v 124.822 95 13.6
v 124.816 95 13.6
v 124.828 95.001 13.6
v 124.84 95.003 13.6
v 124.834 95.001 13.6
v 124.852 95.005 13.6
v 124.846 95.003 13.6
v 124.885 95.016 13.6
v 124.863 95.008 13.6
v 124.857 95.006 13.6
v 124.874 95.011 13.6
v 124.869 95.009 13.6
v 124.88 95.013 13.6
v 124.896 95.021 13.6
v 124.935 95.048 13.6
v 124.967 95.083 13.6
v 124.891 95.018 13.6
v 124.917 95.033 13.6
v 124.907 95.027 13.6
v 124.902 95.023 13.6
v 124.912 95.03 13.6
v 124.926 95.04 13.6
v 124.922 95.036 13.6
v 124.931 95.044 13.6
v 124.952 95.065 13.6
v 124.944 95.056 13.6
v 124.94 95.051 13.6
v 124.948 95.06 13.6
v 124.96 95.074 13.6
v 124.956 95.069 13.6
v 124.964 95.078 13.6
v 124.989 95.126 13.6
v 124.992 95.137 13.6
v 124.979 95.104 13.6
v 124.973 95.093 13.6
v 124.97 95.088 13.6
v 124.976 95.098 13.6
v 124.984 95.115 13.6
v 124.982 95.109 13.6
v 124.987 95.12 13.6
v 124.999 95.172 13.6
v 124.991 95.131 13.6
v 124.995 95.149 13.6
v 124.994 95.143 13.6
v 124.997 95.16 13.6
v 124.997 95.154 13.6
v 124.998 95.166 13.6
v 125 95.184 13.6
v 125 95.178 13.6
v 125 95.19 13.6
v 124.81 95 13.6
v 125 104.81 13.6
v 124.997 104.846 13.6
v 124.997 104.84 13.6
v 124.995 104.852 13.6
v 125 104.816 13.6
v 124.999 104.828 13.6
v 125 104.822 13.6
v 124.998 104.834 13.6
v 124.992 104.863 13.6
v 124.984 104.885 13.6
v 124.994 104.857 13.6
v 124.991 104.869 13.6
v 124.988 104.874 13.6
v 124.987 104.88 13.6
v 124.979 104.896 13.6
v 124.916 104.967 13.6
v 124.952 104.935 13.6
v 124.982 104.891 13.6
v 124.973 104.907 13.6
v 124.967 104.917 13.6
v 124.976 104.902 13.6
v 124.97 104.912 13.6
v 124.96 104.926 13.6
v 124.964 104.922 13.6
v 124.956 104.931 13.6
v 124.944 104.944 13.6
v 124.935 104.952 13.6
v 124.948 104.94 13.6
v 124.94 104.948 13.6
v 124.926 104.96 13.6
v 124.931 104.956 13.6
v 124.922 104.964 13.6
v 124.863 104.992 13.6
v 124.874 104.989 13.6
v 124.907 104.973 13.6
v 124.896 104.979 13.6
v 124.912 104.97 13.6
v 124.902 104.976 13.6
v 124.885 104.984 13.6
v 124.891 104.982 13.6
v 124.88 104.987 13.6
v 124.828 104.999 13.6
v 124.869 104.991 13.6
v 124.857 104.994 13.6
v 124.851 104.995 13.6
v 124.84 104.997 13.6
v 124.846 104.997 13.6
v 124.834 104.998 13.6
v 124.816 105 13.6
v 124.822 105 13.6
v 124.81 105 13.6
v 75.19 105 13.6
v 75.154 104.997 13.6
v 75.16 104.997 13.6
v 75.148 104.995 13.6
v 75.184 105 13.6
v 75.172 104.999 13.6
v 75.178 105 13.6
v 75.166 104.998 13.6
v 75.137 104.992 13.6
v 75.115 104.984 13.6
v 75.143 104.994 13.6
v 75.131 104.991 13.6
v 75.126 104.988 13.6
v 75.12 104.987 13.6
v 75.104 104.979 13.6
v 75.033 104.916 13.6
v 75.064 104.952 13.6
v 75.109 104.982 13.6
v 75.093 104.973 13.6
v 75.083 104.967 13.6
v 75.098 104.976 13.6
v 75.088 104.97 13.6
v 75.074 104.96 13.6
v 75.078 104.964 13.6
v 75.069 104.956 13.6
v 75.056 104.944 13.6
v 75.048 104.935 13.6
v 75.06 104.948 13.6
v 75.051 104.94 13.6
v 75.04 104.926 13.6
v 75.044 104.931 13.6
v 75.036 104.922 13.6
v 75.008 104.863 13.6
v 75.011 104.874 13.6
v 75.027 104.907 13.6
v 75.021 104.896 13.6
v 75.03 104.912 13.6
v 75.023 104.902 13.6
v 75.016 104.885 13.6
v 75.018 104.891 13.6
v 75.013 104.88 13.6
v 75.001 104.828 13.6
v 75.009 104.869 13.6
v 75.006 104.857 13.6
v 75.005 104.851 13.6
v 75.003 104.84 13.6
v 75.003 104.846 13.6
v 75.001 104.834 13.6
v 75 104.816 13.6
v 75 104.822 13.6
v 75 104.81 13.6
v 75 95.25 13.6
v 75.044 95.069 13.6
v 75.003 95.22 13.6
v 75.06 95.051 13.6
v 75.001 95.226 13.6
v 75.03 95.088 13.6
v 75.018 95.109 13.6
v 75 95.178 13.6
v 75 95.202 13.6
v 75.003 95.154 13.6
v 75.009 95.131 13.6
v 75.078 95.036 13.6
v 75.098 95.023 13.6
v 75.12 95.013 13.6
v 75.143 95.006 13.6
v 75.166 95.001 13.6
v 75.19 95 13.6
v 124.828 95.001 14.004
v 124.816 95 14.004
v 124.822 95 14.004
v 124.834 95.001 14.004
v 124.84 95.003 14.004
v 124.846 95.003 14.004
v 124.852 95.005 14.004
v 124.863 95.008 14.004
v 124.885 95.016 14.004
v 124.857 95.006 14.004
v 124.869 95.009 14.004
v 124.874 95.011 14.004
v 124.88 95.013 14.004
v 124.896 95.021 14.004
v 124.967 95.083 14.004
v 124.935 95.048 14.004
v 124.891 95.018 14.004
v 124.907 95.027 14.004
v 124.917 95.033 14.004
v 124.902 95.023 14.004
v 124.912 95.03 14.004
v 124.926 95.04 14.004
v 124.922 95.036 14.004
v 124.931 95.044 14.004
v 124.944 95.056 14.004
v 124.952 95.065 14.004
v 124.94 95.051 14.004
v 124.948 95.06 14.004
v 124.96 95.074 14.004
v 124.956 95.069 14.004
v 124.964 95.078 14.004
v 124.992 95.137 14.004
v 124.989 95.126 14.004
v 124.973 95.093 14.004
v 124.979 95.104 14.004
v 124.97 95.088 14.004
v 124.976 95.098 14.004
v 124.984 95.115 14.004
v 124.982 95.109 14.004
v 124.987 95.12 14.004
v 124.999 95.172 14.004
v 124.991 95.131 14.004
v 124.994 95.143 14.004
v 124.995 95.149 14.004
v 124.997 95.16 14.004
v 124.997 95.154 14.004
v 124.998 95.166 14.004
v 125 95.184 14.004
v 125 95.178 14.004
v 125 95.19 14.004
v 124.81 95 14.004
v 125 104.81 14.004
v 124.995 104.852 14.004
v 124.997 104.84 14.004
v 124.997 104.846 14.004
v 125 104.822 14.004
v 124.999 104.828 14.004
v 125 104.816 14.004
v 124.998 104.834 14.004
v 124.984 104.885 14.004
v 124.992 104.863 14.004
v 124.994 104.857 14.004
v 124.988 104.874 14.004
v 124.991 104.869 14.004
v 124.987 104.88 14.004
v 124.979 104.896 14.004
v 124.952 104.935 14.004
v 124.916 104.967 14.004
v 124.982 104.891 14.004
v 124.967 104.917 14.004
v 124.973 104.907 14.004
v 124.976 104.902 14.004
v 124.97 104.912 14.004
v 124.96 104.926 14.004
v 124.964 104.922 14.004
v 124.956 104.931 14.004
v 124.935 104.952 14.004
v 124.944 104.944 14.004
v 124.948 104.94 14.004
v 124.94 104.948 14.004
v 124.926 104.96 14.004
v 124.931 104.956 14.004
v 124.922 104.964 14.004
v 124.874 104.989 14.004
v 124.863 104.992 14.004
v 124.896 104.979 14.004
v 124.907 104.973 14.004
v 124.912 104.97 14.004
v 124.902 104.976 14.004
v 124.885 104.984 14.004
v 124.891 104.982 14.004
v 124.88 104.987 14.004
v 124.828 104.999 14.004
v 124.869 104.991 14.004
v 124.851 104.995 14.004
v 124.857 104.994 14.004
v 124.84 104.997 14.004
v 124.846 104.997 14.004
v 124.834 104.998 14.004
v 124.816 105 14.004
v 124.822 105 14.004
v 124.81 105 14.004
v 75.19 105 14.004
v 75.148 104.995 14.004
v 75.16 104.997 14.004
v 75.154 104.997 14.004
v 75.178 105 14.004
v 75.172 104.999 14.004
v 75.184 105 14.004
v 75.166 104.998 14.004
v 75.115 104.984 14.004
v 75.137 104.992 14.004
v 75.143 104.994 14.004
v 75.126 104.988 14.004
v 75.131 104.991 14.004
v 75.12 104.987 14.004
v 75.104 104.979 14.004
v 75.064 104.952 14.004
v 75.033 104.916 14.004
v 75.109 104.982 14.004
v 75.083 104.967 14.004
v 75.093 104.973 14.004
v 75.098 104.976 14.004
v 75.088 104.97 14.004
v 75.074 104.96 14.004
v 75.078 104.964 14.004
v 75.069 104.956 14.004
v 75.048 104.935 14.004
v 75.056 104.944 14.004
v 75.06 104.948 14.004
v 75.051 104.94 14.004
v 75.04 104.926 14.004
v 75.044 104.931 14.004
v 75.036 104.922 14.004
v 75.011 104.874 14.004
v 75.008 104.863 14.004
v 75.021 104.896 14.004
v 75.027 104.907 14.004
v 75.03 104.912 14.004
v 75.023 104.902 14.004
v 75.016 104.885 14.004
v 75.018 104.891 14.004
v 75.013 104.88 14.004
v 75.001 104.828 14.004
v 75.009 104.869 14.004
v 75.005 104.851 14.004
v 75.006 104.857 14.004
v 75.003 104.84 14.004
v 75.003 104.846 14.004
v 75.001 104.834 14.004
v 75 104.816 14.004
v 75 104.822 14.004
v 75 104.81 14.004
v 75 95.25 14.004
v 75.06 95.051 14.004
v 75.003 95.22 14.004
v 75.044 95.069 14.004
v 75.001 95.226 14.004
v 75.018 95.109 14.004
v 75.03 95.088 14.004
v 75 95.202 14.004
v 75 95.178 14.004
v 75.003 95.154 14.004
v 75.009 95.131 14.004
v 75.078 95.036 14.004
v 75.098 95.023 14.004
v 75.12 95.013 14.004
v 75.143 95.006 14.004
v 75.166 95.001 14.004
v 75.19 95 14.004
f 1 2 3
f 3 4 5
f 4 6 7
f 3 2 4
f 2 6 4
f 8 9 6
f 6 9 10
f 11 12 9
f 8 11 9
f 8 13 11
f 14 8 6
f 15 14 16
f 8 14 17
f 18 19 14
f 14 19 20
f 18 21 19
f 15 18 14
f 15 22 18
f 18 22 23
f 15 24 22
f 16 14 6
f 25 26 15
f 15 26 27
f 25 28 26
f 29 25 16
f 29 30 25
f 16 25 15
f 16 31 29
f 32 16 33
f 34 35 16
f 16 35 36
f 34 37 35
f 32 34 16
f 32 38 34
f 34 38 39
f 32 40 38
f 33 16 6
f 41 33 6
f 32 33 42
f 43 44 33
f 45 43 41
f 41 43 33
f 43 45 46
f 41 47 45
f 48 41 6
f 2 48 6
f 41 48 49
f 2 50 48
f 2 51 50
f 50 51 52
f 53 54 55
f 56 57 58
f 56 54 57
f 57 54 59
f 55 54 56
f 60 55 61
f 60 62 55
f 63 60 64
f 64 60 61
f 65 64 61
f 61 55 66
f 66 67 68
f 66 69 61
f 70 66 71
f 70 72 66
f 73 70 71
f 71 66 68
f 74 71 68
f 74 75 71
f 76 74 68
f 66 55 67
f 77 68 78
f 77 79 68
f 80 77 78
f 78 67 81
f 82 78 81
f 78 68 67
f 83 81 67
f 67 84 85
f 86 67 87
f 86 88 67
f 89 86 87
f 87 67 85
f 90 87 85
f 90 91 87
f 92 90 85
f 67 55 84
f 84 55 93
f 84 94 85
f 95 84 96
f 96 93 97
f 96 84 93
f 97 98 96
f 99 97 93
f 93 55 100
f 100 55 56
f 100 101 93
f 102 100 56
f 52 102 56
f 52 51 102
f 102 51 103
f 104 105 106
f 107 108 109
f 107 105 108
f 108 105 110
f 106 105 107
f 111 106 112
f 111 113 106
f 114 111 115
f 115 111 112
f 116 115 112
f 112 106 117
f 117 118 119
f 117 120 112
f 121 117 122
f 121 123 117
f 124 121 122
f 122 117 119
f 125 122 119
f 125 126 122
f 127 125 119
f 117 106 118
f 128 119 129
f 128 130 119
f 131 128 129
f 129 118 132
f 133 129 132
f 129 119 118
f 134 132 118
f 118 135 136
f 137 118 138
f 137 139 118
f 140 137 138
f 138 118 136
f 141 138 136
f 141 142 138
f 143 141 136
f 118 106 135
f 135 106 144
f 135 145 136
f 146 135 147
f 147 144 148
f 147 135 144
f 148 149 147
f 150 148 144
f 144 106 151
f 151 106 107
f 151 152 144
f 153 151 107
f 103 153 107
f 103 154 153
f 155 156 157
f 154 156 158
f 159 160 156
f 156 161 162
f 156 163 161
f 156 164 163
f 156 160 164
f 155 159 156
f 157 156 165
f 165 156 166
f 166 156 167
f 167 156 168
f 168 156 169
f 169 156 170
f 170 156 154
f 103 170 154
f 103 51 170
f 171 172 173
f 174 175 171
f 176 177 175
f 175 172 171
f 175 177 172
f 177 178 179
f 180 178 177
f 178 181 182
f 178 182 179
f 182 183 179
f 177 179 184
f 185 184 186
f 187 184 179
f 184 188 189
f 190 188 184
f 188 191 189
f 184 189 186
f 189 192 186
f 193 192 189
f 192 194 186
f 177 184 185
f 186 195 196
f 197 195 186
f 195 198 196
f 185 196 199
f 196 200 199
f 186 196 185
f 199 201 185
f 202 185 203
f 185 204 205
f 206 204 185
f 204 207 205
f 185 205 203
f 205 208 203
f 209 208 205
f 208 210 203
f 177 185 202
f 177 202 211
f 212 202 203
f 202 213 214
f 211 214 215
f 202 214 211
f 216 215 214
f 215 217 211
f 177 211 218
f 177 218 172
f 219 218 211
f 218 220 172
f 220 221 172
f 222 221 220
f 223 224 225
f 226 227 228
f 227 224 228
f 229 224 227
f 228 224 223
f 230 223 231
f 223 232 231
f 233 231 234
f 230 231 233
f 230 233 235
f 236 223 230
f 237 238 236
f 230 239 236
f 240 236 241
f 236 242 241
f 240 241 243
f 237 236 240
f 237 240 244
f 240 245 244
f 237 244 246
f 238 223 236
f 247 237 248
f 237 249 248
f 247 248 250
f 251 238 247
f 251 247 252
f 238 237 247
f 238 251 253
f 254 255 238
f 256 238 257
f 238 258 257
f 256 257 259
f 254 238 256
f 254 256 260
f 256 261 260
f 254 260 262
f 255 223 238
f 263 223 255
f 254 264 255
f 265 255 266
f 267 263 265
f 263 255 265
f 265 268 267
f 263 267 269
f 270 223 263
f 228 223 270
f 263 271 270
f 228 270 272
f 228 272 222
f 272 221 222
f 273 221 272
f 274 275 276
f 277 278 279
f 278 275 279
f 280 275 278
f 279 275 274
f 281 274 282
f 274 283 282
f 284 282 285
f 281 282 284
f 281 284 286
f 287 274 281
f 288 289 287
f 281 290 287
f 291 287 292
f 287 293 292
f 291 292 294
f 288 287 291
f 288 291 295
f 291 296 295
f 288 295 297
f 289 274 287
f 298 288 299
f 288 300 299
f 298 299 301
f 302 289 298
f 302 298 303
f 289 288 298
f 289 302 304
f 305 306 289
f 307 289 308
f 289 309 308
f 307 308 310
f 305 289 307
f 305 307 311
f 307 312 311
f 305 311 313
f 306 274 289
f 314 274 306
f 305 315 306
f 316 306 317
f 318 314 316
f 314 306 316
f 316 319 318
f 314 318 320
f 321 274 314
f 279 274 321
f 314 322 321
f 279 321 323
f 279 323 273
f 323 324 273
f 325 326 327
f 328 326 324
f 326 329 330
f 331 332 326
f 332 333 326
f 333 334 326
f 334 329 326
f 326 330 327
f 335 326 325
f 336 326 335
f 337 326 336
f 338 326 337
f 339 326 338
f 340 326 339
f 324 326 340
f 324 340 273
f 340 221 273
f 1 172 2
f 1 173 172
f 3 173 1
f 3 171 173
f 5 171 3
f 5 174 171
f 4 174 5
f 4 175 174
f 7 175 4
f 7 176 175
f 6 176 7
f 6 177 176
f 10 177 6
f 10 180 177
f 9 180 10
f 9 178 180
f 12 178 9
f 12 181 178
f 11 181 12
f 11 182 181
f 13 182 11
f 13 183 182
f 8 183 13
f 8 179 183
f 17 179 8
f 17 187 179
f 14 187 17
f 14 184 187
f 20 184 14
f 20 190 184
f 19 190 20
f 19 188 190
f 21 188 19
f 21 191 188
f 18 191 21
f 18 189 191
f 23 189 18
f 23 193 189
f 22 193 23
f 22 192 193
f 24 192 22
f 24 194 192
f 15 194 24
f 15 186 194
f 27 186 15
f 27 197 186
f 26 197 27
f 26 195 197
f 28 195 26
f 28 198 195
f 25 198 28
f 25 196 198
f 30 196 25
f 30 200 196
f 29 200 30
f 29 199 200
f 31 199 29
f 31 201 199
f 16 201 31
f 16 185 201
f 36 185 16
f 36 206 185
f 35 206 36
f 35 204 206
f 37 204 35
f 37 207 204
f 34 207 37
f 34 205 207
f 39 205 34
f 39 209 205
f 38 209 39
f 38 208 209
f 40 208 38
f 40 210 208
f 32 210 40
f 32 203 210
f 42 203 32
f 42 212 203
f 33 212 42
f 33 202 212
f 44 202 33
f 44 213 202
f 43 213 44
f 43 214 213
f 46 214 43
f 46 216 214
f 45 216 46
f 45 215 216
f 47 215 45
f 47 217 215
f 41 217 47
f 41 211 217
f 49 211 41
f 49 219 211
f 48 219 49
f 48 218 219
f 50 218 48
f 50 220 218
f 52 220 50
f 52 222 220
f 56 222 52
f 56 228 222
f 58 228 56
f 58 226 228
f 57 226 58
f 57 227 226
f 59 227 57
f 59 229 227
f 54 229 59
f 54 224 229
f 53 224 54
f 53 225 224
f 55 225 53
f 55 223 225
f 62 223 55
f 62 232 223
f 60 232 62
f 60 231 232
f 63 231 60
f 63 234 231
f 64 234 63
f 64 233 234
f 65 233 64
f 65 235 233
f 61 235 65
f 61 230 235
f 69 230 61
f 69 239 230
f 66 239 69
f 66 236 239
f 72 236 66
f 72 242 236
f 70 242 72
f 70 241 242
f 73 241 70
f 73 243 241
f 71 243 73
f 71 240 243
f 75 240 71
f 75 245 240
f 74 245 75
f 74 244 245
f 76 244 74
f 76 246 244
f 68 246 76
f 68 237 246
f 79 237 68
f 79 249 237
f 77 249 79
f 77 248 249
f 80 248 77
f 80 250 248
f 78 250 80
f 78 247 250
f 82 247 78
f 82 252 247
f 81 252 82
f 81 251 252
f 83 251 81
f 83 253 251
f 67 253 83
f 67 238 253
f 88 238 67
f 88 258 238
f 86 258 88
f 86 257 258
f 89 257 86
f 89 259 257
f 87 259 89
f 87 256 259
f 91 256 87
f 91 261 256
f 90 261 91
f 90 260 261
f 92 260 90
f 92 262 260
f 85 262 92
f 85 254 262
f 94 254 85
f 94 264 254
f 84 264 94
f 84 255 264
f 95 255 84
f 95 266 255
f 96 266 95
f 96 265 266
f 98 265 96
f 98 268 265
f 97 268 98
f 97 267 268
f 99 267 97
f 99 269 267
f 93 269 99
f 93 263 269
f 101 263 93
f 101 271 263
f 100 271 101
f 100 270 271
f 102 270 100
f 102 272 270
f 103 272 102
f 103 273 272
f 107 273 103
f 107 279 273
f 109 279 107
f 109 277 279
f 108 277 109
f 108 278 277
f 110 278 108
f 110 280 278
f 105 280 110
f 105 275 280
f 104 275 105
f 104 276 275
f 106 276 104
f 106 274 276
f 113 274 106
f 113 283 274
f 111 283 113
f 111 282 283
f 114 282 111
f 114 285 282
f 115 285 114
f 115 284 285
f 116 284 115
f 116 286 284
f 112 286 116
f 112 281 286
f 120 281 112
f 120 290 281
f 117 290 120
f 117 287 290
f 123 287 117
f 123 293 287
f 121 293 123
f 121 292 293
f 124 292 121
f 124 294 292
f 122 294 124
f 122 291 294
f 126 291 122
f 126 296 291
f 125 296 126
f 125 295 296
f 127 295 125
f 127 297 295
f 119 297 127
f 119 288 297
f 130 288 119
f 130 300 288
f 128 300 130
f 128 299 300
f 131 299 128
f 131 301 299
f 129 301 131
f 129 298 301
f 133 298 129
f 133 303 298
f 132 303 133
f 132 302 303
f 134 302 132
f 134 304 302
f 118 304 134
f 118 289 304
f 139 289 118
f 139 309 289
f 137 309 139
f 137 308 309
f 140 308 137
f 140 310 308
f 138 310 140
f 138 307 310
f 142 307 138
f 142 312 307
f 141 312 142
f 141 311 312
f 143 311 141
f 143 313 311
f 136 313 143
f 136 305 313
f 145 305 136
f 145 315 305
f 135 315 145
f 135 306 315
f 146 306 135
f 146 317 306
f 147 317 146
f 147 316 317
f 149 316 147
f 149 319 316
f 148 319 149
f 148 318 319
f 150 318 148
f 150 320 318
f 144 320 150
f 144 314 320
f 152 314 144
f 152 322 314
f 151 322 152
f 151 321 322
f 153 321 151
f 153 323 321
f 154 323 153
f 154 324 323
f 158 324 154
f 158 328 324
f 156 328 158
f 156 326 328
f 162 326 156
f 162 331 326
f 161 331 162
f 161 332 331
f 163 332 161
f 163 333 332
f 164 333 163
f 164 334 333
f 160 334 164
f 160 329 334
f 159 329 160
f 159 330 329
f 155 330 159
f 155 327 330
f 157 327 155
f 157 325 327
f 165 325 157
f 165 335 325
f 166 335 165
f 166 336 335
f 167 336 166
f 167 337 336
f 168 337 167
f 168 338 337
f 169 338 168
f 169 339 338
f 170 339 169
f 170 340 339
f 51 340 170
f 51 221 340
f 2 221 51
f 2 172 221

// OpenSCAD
module drawBasicShape(x1, y1, x2, y2, width)
{
	length = sqrt((x1-x2)*(x1-x2) + (y1-y2)*(y1-y2));
	if (width!=0.0) {
		square(size = [width, length], center = false);
		translate([width/2.0, 0, 0]) circle(d=width);
		translate([width/2.0, length, 0]) circle(d=width);
	}
}

module translateAndRotate(x1, y1, x2, y2, width)
{
	if (width != 0.0) {
		angle = atan((y2-y1)/(x2-x1)) +270;
		if (x2>=x1) {
			translate([x1, y1, 0.0]) rotate([0.0, 0.0, angle]) translate([-width/2.0, 0.0, 0.0]) scale([1.0, 1.0, 1.0]) drawBasicShape(x1, y1, x2, y2, width);
		}
		else {
			translate([x1, y1, 0.0]) rotate([0.0, 0.0, angle+180]) translate([-width/2.0, 0.0, 0.0]) scale([1.0, 1.0, 1.0]) drawBasicShape(x1, y1, x2, y2, width);		}
	}
}

$fn=50;

points33 = [
[75.77800000, 95.77800000, 0.00000000],
[124.22200000, 95.77800000, 0.37999548],
[124.22200000, 104.22200000, 0.37997788],
[75.77800000, 104.22200000, 0.37999672],
[75.77800000, 95.83800000, 0.37997423],
[75.48400000, 95.48400000, 0.00000000],
[124.51600000, 95.48400000, 0.37999868],
[124.51600000, 104.51600000, 0.37998977],
[75.48400000, 104.51600000, 0.37999746],
[75.48400000, 95.54400000, 0.37999314],
[75.19000000, 95.19000000, 0.00000000],
[124.81000000, 95.19000000, 0.37999939],
[124.81000000, 104.81000000, 0.38000021],
[75.19000000, 104.81000000, 0.38000060],
[75.19000000, 95.25000000, 0.37999715],
[75.53600000, 95.39000000, 0.00000000],
[76.11100000, 95.94600000, 0.00000000],
[75.94600000, 96.11100000, 0.37961375],
[75.94600000, 96.52800000, 0.38001190],
[76.52800000, 95.94600000, 0.37989934],
[76.94500000, 95.94600000, 0.38015610],
[75.94600000, 96.94500000, 0.37994651],
[75.94600000, 97.36200000, 0.38001190],
[77.36200000, 95.94600000, 0.37999592],
[77.77900000, 95.94600000, 0.38001190],
[75.94600000, 97.77900000, 0.37999966],
[75.94600000, 98.19600000, 0.38001190],
[78.19600000, 95.94600000, 0.38002091],
[78.61300000, 95.94600000, 0.38001190],
[75.94600000, 98.61300000, 0.38001957],
[75.94600000, 99.03000000, 0.38001190],
[79.03000000, 95.94600000, 0.38001859],
[79.44700000, 95.94600000, 0.38001190],
[75.94600000, 99.44700000, 0.38002999],
[75.94600000, 99.86400000, 0.38001190],
[79.86400000, 95.94600000, 0.38002811],
[80.28100000, 95.94600000, 0.38001190],
[75.94600000, 100.28100000, 0.38002660],
[75.94600000, 100.69800000, 0.38001190],
[80.69800000, 95.94600000, 0.38003429],
[81.11500000, 95.94600000, 0.38001190],
[75.94600000, 101.11500000, 0.38003252],
[75.94600000, 101.53300000, 0.37930814],
[81.53300000, 95.94600000, 0.37997836],
[81.95000000, 95.94600000, 0.38001190],
[75.94600000, 101.95000000, 0.37998072],
[75.94600000, 102.36700000, 0.38015610],
[82.36700000, 95.94600000, 0.37998277],
[82.78400000, 95.94600000, 0.38001190],
[75.94600000, 102.78400000, 0.37999079],
[75.94600000, 103.20100000, 0.38015610],
[83.20100000, 95.94600000, 0.37999203],
[83.61800000, 95.94600000, 0.38001190],
[75.94600000, 103.61800000, 0.37999868],
[75.95600000, 104.02400000, 0.38048727],
[84.03500000, 95.94600000, 0.38000275],
[84.45200000, 95.94600000, 0.38001190],
[76.34400000, 104.05400000, 0.38000229],
[76.76100000, 104.05400000, 0.38001190],
[84.86900000, 95.94600000, 0.38000754],
[85.28600000, 95.94600000, 0.38001190],
[77.17800000, 104.05400000, 0.38000229],
[77.59500000, 104.05400000, 0.38015610],
[85.70300000, 95.94600000, 0.38000229],
[86.12000000, 95.94600000, 0.38001190],
[78.01200000, 104.05400000, 0.38000754],
[78.42900000, 104.05400000, 0.38001190],
[86.53700000, 95.94600000, 0.38000229],
[86.95400000, 95.94600000, 0.38001190],
[78.84600000, 104.05400000, 0.38000754],
[79.26300000, 104.05400000, 0.38001190],
[87.37100000, 95.94600000, 0.38000229],
[87.78900000, 95.94600000, 0.37945200],
[79.68000000, 104.05400000, 0.37998415],
[80.09700000, 104.05400000, 0.38001190],
[88.20600000, 95.94600000, 0.37998940],
[88.62300000, 95.94600000, 0.38001190],
[80.51500000, 104.05400000, 0.38000229],
[80.93200000, 104.05400000, 0.38001190],
[89.04000000, 95.94600000, 0.38000754],
[89.45700000, 95.94600000, 0.38001190],
[81.34900000, 104.05400000, 0.38000229],
[81.76600000, 104.05400000, 0.38015610],
[89.87400000, 95.94600000, 0.38000229],
[90.29100000, 95.94600000, 0.38001190],
[82.18300000, 104.05400000, 0.38000229],
[82.60000000, 104.05400000, 0.38015610],
[90.70800000, 95.94600000, 0.38000229],
[91.12500000, 95.94600000, 0.38001190],
[83.01700000, 104.05400000, 0.38000754],
[83.43400000, 104.05400000, 0.38001190],
[91.54200000, 95.94600000, 0.38000229],
[91.95900000, 95.94600000, 0.38001190],
[83.85100000, 104.05400000, 0.38000754],
[84.26800000, 104.05400000, 0.38001190],
[92.37600000, 95.94600000, 0.38000229],
[92.79300000, 95.94600000, 0.38015610],
[84.68500000, 104.05400000, 0.38000229],
[85.10200000, 104.05400000, 0.38001190],
[93.21000000, 95.94600000, 0.38000754],
[93.62700000, 95.94600000, 0.38001190],
[85.51900000, 104.05400000, 0.38000229],
[85.93600000, 104.05400000, 0.38001190],
[94.04400000, 95.94600000, 0.38000754],
[94.46200000, 95.94600000, 0.37930814],
[86.35300000, 104.05400000, 0.37998415],
[86.77000000, 104.05400000, 0.38015610],
[94.87900000, 95.94600000, 0.37998415],
[95.29600000, 95.94600000, 0.38001190],
[87.18800000, 104.05400000, 0.38000754],
[87.60500000, 104.05400000, 0.38001190],
[95.71300000, 95.94600000, 0.38000229],
[96.13000000, 95.94600000, 0.38001190],
[88.02200000, 104.05400000, 0.38000754],
[88.43900000, 104.05400000, 0.38001190],
[96.54700000, 95.94600000, 0.38000229],
[96.96400000, 95.94600000, 0.38015610],
[88.85600000, 104.05400000, 0.38000229],
[89.27300000, 104.05400000, 0.38001190],
[97.38100000, 95.94600000, 0.38000754],
[97.79800000, 95.94600000, 0.38001190],
[89.69000000, 104.05400000, 0.38000229],
[90.10700000, 104.05400000, 0.38001190],
[98.21500000, 95.94600000, 0.38000754],
[98.63200000, 95.94600000, 0.38001190],
[90.52400000, 104.05400000, 0.38000229],
[90.94100000, 104.05400000, 0.38015610],
[99.04900000, 95.94600000, 0.38000229],
[99.46600000, 95.94600000, 0.38001190],
[91.35800000, 104.05400000, 0.38000754],
[91.77500000, 104.05400000, 0.38001190],
[99.88300000, 95.94600000, 0.38000229],
[100.30000000, 95.94600000, 0.38001190],
[92.19200000, 104.05400000, 0.38000754],
[92.60900000, 104.05400000, 0.38001190],
[100.71800000, 95.94600000, 0.37998415],
[101.13500000, 95.94600000, 0.38015610],
[93.02600000, 104.05400000, 0.37998415],
[93.44400000, 104.05400000, 0.37930814],
[101.55200000, 95.94600000, 0.38000754],
[101.96900000, 95.94600000, 0.38001190],
[93.86100000, 104.05400000, 0.38000229],
[94.27800000, 104.05400000, 0.38001190],
[102.38600000, 95.94600000, 0.38000754],
[102.80300000, 95.94600000, 0.38001190],
[94.69500000, 104.05400000, 0.38000229],
[95.11200000, 104.05400000, 0.38015610],
[103.22000000, 95.94600000, 0.38000229],
[103.63700000, 95.94600000, 0.38001190],
[95.52900000, 104.05400000, 0.38000754],
[95.94600000, 104.05400000, 0.38001190],
[104.05400000, 95.94600000, 0.38000229],
[104.47100000, 95.94600000, 0.38001190],
[96.36300000, 104.05400000, 0.38000754],
[96.78000000, 104.05400000, 0.38001190],
[104.88800000, 95.94600000, 0.38000229],
[105.30500000, 95.94600000, 0.38015610],
[97.19700000, 104.05400000, 0.38000229],
[97.61400000, 104.05400000, 0.38001190],
[105.72200000, 95.94600000, 0.38000754],
[106.13900000, 95.94600000, 0.38001190],
[98.03100000, 104.05400000, 0.38000229],
[98.44800000, 104.05400000, 0.38001190],
[106.55600000, 95.94600000, 0.38000754],
[106.97300000, 95.94600000, 0.38001190],
[98.86500000, 104.05400000, 0.38000229],
[99.28200000, 104.05400000, 0.38015610],
[107.39100000, 95.94600000, 0.37998415],
[107.80800000, 95.94600000, 0.38001190],
[99.69900000, 104.05400000, 0.37998940],
[100.11700000, 104.05400000, 0.37930814],
[108.22500000, 95.94600000, 0.38000229],
[108.64200000, 95.94600000, 0.38001190],
[100.53400000, 104.05400000, 0.38000754],
[100.95100000, 104.05400000, 0.38001190],
[109.05900000, 95.94600000, 0.38000229],
[109.47600000, 95.94600000, 0.38015610],
[101.36800000, 104.05400000, 0.38000229],
[101.78500000, 104.05400000, 0.38001190],
[109.89300000, 95.94600000, 0.38000754],
[110.31000000, 95.94600000, 0.38001190],
[102.20200000, 104.05400000, 0.38000229],
[102.61900000, 104.05400000, 0.38001190],
[110.72700000, 95.94600000, 0.38000754],
[111.14400000, 95.94600000, 0.38001190],
[103.03600000, 104.05400000, 0.38000229],
[103.45300000, 104.05400000, 0.38015610],
[111.56100000, 95.94600000, 0.38000229],
[111.97800000, 95.94600000, 0.38001190],
[103.87000000, 104.05400000, 0.38000754],
[104.28700000, 104.05400000, 0.38001190],
[112.39500000, 95.94600000, 0.38000229],
[112.81200000, 95.94600000, 0.38001190],
[104.70400000, 104.05400000, 0.38000754],
[105.12100000, 104.05400000, 0.38001190],
[113.22900000, 95.94600000, 0.38000229],
[113.64700000, 95.94600000, 0.37945200],
[105.53800000, 104.05400000, 0.37998415],
[105.95500000, 104.05400000, 0.38001190],
[114.06400000, 95.94600000, 0.37998940],
[114.48100000, 95.94600000, 0.38001190],
[106.37300000, 104.05400000, 0.38000229],
[106.79000000, 104.05400000, 0.38001190],
[114.89800000, 95.94600000, 0.38000754],
[115.31500000, 95.94600000, 0.38001190],
[107.20700000, 104.05400000, 0.38000229],
[107.62400000, 104.05400000, 0.38015610],
[115.73200000, 95.94600000, 0.38000229],
[116.14900000, 95.94600000, 0.38001190],
[108.04100000, 104.05400000, 0.38000754],
[108.45800000, 104.05400000, 0.38001190],
[116.56600000, 95.94600000, 0.38000229],
[116.98300000, 95.94600000, 0.38001190],
[108.87500000, 104.05400000, 0.38000754],
[109.29200000, 104.05400000, 0.38001190],
[117.40000000, 95.94600000, 0.38000229],
[117.81700000, 95.94600000, 0.38015610],
[109.70900000, 104.05400000, 0.38000229],
[110.12600000, 104.05400000, 0.38001190],
[118.23400000, 95.94600000, 0.38000754],
[118.65100000, 95.94600000, 0.38001190],
[110.54300000, 104.05400000, 0.38000229],
[110.96000000, 104.05400000, 0.38001190],
[119.06800000, 95.94600000, 0.38000754],
[119.48500000, 95.94600000, 0.38001190],
[111.37700000, 104.05400000, 0.38000229],
[111.79400000, 104.05400000, 0.38015610],
[119.90200000, 95.94600000, 0.38000229],
[120.32000000, 95.94600000, 0.37930814],
[112.21100000, 104.05400000, 0.37998940],
[112.62900000, 104.05400000, 0.37930814],
[120.73700000, 95.94600000, 0.38000229],
[121.15400000, 95.94600000, 0.38001190],
[113.04600000, 104.05400000, 0.38000754],
[113.46300000, 104.05400000, 0.38001190],
[121.57100000, 95.94600000, 0.38000229],
[121.98800000, 95.94600000, 0.38015610],
[113.88000000, 104.05400000, 0.38000229],
[114.29700000, 104.05400000, 0.38001190],
[122.40500000, 95.94600000, 0.38000754],
[122.82200000, 95.94600000, 0.38001190],
[114.71400000, 104.05400000, 0.38000229],
[115.13100000, 104.05400000, 0.38001190],
[123.23900000, 95.94600000, 0.38000754],
[123.65600000, 95.94600000, 0.38001190],
[115.54800000, 104.05400000, 0.38000229],
[115.96500000, 104.05400000, 0.38015610],
[124.04400000, 95.97500000, 0.37998455],
[124.05400000, 96.38200000, 0.37961606],
[116.38200000, 104.05400000, 0.37999868],
[116.79900000, 104.05400000, 0.38015610],
[124.05400000, 96.79900000, 0.37999203],
[124.05400000, 97.21600000, 0.38001190],
[117.21600000, 104.05400000, 0.37999701],
[117.63300000, 104.05400000, 0.38001190],
[124.05400000, 97.63300000, 0.37998939],
[124.05400000, 98.05000000, 0.38001190],
[118.05000000, 104.05400000, 0.37998780],
[118.46700000, 104.05400000, 0.38001190],
[124.05400000, 98.46700000, 0.37998597],
[124.05400000, 98.88400000, 0.38001190],
[118.88400000, 104.05400000, 0.37997562],
[119.30200000, 104.05400000, 0.37930814],
[124.05400000, 99.30200000, 0.38003429],
[124.05400000, 99.71900000, 0.38001190],
[119.71900000, 104.05400000, 0.38002660],
[120.13600000, 104.05400000, 0.38015610],
[124.05400000, 100.13600000, 0.38002811],
[124.05400000, 100.55300000, 0.38001190],
[120.55300000, 104.05400000, 0.38002999],
[120.97000000, 104.05400000, 0.38001190],
[124.05400000, 100.97000000, 0.38001859],
[124.05400000, 101.38700000, 0.38015610],
[121.38700000, 104.05400000, 0.38001957],
[121.80400000, 104.05400000, 0.38001190],
[124.05400000, 101.80400000, 0.38002091],
[124.05400000, 102.22100000, 0.38001190],
[122.22100000, 104.05400000, 0.37999966],
[122.63800000, 104.05400000, 0.38015610],
[124.05400000, 102.63800000, 0.37999592],
[124.05400000, 103.05500000, 0.38001190],
[123.05500000, 104.05400000, 0.37998907],
[123.47200000, 104.05400000, 0.38001190],
[124.05400000, 103.47200000, 0.37989934],
[124.05400000, 103.88900000, 0.38015610],
[123.88900000, 104.05400000, 0.37961375],
];

translate([0.0, 0.0, 13.60000000]) {
	linear_extrude(height = 0.40400000, center = false, convexity = 10, twist = 0) {
		union() {
			for( i=[0:len(points33)-2] ){ 
				x1 = points33[i][0];
				y1 = points33[i][1];
				x2 = points33[i+1][0];
				y2 = points33[i+1][1];
				width = points33[i+1][2];
				translateAndRotate(x1, y1, x2, y2, width);
			}
		}
	}
}
